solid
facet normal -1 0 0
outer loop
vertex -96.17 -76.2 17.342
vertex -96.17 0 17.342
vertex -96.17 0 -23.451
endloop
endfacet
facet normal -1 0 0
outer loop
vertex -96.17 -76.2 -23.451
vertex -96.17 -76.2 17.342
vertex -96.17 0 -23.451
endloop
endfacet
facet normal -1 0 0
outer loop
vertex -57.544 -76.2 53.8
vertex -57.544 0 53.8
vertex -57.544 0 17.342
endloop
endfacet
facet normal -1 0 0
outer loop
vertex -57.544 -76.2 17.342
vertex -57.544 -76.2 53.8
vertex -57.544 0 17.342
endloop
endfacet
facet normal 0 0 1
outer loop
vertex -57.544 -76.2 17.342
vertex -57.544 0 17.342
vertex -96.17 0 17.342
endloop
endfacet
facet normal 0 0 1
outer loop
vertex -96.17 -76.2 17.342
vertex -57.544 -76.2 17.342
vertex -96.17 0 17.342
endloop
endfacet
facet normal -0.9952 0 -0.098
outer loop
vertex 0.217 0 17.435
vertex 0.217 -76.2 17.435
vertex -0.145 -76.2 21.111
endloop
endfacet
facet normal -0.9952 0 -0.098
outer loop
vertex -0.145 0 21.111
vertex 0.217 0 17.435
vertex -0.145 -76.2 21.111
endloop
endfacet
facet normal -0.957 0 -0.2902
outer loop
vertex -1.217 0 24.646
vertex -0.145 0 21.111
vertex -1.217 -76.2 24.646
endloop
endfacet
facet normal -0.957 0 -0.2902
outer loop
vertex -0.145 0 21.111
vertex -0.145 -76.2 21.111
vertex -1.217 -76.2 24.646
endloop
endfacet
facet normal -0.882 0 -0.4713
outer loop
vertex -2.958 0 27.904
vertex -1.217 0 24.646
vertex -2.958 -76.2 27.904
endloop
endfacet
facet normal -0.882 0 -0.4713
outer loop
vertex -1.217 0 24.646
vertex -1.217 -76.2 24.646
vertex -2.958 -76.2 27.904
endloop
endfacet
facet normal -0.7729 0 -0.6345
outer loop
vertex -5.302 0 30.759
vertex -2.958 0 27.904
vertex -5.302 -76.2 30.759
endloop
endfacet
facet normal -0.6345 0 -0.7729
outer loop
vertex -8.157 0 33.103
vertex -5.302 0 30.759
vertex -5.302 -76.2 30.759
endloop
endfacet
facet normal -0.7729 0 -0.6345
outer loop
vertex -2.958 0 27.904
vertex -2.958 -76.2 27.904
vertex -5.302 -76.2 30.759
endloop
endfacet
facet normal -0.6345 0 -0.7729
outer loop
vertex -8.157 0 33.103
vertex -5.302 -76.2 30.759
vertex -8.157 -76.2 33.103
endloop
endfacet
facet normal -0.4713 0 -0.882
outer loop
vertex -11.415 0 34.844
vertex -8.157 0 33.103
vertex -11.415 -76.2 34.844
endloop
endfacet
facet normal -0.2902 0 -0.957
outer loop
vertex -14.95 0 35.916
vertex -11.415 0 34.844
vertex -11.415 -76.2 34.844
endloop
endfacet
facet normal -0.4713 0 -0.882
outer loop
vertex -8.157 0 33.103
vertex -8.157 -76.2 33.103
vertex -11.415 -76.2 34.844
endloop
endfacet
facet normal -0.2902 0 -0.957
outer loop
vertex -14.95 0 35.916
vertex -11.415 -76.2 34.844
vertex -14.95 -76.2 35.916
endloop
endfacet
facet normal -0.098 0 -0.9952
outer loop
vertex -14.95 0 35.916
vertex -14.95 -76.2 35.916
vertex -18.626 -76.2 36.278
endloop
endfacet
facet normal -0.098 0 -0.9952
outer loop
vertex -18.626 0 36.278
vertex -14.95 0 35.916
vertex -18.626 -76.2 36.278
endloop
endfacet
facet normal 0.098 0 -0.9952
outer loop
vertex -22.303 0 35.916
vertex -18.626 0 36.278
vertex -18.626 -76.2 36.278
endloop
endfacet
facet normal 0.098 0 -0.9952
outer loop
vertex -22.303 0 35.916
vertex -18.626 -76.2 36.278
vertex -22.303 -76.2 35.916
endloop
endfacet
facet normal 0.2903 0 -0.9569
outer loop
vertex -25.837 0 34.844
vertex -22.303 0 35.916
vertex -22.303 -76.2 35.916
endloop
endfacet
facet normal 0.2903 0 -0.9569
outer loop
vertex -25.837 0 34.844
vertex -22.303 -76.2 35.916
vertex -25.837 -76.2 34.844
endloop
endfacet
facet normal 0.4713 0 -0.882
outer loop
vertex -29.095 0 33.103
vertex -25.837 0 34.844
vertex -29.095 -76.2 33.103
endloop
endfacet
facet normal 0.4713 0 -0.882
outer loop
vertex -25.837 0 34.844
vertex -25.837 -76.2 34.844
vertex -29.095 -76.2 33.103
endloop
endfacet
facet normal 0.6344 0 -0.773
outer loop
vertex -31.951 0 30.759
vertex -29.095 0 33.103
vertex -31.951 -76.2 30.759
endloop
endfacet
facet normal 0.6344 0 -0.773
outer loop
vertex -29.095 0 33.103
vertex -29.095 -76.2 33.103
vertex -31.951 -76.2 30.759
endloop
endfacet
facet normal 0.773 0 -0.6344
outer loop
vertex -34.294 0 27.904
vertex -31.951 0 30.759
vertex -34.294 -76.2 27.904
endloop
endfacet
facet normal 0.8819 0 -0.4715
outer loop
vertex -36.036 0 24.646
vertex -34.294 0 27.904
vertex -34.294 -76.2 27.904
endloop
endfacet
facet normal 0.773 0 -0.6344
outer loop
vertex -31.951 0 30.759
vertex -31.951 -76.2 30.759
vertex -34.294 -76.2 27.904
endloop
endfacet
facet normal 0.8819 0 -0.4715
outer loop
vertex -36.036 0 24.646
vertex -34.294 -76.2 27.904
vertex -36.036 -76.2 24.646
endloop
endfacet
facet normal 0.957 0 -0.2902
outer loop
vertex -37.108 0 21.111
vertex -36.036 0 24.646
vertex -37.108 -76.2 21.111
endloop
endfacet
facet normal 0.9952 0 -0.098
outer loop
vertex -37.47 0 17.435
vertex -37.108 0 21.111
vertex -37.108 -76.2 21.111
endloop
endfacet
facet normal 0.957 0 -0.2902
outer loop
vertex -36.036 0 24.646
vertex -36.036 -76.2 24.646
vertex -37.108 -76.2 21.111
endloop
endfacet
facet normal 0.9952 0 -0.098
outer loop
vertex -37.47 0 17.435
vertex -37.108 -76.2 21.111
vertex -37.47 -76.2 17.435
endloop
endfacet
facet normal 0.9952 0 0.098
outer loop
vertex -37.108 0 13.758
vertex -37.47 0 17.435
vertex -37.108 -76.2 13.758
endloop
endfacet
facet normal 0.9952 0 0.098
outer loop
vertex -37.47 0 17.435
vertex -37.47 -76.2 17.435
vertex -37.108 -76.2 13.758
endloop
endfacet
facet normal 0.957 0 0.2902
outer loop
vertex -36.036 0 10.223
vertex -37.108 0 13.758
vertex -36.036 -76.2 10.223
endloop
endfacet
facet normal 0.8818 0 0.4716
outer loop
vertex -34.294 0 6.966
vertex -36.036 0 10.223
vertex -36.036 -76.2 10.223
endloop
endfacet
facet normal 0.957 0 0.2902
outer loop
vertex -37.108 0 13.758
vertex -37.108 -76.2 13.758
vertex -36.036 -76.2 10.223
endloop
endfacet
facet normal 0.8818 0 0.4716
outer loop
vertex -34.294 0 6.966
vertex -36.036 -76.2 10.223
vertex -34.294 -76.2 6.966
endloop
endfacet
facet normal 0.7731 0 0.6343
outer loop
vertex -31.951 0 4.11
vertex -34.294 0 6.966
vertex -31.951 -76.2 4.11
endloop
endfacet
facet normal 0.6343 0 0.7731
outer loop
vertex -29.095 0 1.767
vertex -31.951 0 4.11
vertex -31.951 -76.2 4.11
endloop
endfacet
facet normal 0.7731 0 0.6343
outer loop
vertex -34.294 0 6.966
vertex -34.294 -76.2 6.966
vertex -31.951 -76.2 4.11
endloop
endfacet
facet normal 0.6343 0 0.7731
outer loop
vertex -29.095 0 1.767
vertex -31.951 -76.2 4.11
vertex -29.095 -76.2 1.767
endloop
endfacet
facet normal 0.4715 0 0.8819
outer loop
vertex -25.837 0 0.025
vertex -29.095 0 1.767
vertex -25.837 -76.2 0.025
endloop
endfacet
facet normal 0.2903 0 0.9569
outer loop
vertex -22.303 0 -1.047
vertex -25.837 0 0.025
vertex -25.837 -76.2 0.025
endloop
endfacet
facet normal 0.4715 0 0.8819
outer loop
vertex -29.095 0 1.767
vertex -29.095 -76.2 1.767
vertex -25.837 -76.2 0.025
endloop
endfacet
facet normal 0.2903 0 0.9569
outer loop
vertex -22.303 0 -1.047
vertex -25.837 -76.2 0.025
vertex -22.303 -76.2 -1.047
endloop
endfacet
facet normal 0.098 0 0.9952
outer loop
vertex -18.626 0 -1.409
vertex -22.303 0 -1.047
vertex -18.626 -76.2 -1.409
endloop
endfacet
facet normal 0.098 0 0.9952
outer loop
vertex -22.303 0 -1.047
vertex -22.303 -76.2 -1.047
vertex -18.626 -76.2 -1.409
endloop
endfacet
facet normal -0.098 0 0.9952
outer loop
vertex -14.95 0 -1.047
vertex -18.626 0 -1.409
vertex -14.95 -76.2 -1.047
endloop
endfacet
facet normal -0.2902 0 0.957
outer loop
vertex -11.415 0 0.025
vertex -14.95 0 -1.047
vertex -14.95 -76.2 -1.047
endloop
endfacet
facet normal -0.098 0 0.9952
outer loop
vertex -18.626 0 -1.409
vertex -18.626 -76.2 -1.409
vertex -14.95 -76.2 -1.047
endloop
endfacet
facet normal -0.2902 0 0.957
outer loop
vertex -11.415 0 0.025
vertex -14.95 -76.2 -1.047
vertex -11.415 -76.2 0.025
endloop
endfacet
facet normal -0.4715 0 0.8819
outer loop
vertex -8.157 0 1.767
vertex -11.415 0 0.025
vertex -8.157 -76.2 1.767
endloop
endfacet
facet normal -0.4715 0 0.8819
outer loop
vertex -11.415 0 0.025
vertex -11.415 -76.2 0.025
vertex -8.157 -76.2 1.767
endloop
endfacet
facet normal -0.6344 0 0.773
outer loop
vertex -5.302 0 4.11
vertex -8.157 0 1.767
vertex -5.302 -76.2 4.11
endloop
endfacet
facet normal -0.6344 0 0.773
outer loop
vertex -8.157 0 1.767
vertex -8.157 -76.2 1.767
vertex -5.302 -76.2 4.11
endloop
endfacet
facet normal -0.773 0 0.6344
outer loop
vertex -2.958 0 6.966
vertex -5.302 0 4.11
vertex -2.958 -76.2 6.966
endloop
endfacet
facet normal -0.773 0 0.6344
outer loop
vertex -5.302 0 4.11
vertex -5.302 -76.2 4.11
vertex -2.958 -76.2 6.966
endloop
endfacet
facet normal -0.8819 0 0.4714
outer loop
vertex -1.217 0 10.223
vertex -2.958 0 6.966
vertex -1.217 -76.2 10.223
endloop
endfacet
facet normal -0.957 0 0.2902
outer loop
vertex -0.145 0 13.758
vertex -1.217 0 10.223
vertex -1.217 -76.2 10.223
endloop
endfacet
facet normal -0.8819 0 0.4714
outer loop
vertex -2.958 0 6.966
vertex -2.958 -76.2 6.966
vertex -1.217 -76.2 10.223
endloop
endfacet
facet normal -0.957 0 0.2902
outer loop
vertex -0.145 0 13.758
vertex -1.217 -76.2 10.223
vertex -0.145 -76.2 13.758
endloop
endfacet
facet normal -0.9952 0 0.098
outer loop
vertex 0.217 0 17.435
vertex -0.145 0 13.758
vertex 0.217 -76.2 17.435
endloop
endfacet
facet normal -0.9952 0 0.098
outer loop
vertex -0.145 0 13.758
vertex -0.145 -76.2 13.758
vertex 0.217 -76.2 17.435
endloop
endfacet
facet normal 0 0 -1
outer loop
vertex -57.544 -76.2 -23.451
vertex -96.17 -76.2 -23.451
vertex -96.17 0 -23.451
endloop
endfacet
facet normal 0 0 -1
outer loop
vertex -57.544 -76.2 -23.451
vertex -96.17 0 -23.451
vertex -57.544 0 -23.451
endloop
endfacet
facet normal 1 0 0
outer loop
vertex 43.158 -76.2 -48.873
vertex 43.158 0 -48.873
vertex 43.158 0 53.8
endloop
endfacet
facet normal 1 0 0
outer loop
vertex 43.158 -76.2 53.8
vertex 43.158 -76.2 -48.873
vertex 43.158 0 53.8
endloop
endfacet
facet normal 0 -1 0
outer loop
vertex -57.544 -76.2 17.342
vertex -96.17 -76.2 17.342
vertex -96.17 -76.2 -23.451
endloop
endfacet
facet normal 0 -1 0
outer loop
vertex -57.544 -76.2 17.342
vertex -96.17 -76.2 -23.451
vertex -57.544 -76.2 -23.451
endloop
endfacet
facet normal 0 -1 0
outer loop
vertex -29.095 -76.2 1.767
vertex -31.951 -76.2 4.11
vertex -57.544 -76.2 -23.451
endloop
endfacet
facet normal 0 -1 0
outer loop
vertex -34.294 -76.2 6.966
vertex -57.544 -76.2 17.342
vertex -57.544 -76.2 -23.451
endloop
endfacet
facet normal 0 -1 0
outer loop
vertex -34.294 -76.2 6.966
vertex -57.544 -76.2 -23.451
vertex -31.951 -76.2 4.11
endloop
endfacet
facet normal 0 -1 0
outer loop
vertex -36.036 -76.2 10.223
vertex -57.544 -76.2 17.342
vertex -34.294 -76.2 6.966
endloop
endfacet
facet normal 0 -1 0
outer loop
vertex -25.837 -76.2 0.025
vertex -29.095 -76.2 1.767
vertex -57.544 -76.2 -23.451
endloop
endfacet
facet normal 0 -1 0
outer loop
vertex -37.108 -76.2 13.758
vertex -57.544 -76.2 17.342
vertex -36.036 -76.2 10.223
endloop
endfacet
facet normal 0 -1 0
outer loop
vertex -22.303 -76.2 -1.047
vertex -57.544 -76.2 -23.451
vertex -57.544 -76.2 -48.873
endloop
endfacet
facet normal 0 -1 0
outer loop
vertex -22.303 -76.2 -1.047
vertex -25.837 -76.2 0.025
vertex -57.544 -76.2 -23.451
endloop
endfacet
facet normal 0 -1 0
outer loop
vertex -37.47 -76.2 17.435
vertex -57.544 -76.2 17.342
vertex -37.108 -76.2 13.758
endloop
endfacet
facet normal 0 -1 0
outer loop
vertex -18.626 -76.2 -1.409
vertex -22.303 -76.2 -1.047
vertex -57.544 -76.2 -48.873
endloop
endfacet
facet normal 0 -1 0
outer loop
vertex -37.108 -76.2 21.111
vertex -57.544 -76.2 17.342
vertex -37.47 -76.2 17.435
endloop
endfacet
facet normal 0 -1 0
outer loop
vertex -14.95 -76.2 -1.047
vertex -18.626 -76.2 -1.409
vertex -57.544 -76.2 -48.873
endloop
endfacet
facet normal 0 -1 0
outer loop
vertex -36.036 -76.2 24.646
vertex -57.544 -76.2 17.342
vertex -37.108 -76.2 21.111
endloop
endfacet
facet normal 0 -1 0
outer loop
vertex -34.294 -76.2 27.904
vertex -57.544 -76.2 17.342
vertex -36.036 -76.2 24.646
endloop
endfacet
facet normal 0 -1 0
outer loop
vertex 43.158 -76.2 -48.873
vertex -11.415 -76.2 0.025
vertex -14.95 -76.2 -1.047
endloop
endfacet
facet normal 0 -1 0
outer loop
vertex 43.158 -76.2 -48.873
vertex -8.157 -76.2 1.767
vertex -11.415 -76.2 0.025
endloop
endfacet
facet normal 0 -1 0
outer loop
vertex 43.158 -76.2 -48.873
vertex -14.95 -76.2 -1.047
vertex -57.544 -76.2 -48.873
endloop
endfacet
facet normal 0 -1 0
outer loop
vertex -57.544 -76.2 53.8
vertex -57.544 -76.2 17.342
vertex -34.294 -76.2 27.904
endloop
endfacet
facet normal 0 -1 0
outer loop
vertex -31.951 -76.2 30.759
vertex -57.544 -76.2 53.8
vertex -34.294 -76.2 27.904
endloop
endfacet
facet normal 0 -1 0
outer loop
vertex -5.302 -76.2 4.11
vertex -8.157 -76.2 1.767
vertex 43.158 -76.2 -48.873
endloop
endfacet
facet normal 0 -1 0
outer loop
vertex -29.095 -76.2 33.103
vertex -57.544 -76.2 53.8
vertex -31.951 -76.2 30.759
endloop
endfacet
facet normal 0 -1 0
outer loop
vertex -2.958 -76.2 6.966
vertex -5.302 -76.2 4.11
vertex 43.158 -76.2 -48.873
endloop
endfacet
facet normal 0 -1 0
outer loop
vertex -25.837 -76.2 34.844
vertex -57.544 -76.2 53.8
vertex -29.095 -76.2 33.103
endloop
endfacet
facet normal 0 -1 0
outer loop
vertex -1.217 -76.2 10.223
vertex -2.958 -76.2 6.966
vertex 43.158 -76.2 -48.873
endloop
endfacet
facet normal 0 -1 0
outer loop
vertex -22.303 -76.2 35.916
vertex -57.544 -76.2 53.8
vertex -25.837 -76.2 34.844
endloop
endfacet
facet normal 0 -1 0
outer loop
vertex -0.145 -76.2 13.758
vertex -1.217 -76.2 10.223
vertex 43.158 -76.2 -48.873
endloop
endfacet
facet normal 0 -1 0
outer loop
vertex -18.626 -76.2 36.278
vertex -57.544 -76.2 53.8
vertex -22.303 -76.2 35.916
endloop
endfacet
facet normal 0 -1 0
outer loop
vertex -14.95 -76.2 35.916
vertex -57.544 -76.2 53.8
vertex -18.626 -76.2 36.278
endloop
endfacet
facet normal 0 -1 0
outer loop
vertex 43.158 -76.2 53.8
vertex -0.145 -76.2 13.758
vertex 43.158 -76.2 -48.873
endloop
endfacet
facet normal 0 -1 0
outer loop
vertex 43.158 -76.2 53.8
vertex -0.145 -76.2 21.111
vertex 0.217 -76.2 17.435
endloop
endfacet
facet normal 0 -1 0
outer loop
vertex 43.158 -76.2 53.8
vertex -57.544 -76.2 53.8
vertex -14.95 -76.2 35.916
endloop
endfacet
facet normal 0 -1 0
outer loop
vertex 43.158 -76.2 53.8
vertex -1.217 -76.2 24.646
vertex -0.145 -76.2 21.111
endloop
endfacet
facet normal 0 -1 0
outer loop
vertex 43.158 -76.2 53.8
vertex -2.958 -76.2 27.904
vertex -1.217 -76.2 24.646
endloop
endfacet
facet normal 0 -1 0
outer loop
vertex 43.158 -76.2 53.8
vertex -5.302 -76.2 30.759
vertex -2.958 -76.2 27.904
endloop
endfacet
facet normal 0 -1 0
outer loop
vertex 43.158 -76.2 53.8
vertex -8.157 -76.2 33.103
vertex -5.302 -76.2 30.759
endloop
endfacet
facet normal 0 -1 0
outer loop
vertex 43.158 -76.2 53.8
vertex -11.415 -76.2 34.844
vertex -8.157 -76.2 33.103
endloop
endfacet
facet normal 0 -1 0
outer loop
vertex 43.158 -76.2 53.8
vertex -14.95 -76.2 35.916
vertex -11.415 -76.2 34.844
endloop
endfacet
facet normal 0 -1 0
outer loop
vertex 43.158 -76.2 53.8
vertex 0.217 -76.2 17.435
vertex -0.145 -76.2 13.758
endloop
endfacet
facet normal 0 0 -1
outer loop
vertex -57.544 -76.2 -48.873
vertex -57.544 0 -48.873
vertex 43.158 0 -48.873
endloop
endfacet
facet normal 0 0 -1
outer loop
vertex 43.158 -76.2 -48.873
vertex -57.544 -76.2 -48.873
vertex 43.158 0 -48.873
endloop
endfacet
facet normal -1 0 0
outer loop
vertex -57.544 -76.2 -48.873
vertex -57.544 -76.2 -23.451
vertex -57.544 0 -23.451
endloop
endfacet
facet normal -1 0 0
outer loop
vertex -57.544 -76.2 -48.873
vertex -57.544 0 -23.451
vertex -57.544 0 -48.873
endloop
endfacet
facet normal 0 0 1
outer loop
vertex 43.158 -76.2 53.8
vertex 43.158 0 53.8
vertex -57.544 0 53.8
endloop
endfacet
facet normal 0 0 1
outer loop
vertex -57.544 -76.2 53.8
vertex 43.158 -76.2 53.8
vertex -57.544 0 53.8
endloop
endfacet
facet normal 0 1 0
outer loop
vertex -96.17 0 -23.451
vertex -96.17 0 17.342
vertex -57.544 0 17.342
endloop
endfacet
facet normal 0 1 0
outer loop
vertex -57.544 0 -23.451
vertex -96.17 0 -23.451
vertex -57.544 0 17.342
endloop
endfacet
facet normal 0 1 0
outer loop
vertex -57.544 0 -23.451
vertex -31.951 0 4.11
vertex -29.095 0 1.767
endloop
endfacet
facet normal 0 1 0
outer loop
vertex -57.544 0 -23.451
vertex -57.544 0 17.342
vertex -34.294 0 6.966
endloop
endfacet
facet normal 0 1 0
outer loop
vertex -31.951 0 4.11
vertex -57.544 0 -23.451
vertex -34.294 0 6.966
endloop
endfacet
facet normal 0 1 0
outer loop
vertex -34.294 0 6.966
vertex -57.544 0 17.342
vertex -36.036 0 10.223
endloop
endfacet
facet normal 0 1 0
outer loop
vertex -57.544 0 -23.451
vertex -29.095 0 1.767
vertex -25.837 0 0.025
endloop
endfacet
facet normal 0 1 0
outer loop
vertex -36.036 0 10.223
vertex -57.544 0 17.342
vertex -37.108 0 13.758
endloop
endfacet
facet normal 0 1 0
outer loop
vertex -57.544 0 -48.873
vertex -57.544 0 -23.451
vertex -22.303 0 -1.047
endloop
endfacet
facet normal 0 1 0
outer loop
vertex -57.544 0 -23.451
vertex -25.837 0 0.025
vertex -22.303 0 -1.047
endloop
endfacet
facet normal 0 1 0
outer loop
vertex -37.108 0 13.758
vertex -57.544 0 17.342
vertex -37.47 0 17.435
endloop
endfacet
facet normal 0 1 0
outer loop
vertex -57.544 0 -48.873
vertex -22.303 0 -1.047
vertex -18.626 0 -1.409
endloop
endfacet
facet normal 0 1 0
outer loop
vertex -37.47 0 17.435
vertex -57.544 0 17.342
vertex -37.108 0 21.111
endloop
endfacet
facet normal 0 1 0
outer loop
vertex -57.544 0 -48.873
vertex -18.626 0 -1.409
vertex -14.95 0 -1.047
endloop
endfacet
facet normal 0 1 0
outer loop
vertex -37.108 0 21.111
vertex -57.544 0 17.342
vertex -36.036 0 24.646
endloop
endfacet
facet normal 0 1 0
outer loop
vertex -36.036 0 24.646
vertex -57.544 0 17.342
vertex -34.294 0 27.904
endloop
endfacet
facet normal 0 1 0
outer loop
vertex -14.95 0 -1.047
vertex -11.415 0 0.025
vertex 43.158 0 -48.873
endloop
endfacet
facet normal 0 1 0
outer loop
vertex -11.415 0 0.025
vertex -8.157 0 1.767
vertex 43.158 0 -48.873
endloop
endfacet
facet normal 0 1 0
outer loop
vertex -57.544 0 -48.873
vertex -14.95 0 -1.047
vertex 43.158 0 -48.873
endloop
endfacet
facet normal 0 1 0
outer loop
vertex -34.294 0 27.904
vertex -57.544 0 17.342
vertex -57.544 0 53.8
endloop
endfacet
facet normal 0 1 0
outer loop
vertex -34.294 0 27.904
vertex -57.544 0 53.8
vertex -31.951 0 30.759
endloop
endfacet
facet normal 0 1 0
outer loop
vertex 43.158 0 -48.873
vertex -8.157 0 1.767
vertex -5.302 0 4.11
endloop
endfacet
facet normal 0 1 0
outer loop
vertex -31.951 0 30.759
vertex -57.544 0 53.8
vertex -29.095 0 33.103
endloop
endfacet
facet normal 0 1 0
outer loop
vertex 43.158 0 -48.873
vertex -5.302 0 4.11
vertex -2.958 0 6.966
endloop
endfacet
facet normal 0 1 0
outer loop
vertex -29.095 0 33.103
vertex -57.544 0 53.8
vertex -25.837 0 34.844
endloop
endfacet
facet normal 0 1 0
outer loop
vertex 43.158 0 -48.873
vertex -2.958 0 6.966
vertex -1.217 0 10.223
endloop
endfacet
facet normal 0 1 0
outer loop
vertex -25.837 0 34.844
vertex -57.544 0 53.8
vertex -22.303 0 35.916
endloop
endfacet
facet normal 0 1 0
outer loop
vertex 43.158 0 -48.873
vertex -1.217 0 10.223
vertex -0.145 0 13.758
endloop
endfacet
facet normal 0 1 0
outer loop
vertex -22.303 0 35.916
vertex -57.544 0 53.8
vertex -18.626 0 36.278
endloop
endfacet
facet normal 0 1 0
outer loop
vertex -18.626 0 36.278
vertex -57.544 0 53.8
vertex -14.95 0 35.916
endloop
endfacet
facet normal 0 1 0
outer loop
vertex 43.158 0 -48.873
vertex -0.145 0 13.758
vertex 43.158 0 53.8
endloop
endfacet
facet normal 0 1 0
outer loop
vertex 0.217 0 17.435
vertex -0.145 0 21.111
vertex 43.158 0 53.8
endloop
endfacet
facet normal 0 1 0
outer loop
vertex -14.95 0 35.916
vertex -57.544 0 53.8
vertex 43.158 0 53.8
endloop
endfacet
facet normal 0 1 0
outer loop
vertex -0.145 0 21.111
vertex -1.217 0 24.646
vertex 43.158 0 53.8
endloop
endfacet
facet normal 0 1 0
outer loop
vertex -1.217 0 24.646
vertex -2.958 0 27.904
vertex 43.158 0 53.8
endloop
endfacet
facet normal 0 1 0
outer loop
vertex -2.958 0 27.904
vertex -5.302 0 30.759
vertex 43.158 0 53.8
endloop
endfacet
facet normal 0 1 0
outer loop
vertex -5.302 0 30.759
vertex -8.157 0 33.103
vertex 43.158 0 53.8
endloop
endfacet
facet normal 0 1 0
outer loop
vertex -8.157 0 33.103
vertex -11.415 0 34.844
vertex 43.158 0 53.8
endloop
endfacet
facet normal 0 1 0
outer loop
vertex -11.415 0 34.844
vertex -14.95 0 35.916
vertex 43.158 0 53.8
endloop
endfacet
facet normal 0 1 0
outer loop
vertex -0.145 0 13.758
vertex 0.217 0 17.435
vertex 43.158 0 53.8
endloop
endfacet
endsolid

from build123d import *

# Parameters (mm, degrees)
F1_DEPTH = 76.2
F2_R     = 18.84371
F3_DEPTH = 76.2


with BuildPart() as f1:
    # F0 (on Front) → F1 (new body)
    with BuildSketch(Plane.XZ):
        Polygon((-57.544138, 17.34207), (-96.169658, 17.34207), (-96.169658, -23.451207), (-57.544138, -23.451207), (-57.544138, -48.873104), (43.158107, -48.873104), (43.158107, 53.799827), (-57.544138, 53.799827), align=None)
    extrude(amount=F1_DEPTH)

    # F2 (on face) → F3 (cut)
    with BuildSketch(Plane.XZ.offset(76.2)):
        with Locations((-18.626319, 17.434625)):
            Circle(F2_R)
    extrude(amount=-F3_DEPTH, mode=Mode.SUBTRACT)


solid = f1.part
